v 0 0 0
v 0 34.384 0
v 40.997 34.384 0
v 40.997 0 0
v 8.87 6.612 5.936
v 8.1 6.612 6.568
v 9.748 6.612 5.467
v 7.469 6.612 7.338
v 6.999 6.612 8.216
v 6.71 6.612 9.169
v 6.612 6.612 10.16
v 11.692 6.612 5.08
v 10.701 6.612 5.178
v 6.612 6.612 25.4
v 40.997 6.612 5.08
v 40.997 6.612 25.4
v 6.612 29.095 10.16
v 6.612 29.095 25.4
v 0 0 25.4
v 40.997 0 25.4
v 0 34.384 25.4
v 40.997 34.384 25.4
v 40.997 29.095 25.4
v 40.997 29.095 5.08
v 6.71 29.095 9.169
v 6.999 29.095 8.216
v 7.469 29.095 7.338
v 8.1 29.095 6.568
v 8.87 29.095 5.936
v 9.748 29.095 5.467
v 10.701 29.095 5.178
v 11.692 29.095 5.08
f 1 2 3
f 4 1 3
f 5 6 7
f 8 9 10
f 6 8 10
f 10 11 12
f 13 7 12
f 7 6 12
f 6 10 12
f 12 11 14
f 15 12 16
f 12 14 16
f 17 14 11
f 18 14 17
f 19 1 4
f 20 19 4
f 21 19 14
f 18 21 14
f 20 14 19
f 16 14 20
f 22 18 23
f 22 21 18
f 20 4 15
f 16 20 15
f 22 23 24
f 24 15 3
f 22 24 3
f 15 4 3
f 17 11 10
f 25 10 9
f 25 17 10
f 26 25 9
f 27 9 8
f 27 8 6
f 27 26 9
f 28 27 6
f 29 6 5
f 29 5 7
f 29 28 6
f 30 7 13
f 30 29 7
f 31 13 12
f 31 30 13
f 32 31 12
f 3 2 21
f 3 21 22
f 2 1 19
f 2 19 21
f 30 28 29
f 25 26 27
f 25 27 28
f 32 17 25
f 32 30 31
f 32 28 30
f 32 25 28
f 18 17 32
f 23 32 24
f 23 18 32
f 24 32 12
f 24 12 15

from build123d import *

# Parameters (mm, degrees)
F0_W     = 40.996857
F0_H     = 34.384463
F1_DEPTH = 25.4
F2_W     = 34.38446
F2_H     = 22.48215
F3_DEPTH = 20.32
F4_R     = 5.08


with BuildPart() as f1:
    # F0 (on Top) → F1 (new body)
    with BuildSketch(Plane.XY):
        with Locations((20.498428, 17.192231)):
            Rectangle(F0_W, F0_H)
    extrude(amount=F1_DEPTH)

    # F2 (on face) → F3 (cut)
    with BuildSketch(Plane.XY.offset(25.4)):
        with Locations((23.804627, 17.853472)):
            Rectangle(F2_W, F2_H)
    extrude(amount=-F3_DEPTH, mode=Mode.SUBTRACT)

    # F4
    f4_edges = [f1.edges().sort_by_distance(p)[0] for p in [
        (6.612397, 17.853472, 5.08),
    ]]
    fillet(f4_edges, radius=F4_R)


solid = f1.part
